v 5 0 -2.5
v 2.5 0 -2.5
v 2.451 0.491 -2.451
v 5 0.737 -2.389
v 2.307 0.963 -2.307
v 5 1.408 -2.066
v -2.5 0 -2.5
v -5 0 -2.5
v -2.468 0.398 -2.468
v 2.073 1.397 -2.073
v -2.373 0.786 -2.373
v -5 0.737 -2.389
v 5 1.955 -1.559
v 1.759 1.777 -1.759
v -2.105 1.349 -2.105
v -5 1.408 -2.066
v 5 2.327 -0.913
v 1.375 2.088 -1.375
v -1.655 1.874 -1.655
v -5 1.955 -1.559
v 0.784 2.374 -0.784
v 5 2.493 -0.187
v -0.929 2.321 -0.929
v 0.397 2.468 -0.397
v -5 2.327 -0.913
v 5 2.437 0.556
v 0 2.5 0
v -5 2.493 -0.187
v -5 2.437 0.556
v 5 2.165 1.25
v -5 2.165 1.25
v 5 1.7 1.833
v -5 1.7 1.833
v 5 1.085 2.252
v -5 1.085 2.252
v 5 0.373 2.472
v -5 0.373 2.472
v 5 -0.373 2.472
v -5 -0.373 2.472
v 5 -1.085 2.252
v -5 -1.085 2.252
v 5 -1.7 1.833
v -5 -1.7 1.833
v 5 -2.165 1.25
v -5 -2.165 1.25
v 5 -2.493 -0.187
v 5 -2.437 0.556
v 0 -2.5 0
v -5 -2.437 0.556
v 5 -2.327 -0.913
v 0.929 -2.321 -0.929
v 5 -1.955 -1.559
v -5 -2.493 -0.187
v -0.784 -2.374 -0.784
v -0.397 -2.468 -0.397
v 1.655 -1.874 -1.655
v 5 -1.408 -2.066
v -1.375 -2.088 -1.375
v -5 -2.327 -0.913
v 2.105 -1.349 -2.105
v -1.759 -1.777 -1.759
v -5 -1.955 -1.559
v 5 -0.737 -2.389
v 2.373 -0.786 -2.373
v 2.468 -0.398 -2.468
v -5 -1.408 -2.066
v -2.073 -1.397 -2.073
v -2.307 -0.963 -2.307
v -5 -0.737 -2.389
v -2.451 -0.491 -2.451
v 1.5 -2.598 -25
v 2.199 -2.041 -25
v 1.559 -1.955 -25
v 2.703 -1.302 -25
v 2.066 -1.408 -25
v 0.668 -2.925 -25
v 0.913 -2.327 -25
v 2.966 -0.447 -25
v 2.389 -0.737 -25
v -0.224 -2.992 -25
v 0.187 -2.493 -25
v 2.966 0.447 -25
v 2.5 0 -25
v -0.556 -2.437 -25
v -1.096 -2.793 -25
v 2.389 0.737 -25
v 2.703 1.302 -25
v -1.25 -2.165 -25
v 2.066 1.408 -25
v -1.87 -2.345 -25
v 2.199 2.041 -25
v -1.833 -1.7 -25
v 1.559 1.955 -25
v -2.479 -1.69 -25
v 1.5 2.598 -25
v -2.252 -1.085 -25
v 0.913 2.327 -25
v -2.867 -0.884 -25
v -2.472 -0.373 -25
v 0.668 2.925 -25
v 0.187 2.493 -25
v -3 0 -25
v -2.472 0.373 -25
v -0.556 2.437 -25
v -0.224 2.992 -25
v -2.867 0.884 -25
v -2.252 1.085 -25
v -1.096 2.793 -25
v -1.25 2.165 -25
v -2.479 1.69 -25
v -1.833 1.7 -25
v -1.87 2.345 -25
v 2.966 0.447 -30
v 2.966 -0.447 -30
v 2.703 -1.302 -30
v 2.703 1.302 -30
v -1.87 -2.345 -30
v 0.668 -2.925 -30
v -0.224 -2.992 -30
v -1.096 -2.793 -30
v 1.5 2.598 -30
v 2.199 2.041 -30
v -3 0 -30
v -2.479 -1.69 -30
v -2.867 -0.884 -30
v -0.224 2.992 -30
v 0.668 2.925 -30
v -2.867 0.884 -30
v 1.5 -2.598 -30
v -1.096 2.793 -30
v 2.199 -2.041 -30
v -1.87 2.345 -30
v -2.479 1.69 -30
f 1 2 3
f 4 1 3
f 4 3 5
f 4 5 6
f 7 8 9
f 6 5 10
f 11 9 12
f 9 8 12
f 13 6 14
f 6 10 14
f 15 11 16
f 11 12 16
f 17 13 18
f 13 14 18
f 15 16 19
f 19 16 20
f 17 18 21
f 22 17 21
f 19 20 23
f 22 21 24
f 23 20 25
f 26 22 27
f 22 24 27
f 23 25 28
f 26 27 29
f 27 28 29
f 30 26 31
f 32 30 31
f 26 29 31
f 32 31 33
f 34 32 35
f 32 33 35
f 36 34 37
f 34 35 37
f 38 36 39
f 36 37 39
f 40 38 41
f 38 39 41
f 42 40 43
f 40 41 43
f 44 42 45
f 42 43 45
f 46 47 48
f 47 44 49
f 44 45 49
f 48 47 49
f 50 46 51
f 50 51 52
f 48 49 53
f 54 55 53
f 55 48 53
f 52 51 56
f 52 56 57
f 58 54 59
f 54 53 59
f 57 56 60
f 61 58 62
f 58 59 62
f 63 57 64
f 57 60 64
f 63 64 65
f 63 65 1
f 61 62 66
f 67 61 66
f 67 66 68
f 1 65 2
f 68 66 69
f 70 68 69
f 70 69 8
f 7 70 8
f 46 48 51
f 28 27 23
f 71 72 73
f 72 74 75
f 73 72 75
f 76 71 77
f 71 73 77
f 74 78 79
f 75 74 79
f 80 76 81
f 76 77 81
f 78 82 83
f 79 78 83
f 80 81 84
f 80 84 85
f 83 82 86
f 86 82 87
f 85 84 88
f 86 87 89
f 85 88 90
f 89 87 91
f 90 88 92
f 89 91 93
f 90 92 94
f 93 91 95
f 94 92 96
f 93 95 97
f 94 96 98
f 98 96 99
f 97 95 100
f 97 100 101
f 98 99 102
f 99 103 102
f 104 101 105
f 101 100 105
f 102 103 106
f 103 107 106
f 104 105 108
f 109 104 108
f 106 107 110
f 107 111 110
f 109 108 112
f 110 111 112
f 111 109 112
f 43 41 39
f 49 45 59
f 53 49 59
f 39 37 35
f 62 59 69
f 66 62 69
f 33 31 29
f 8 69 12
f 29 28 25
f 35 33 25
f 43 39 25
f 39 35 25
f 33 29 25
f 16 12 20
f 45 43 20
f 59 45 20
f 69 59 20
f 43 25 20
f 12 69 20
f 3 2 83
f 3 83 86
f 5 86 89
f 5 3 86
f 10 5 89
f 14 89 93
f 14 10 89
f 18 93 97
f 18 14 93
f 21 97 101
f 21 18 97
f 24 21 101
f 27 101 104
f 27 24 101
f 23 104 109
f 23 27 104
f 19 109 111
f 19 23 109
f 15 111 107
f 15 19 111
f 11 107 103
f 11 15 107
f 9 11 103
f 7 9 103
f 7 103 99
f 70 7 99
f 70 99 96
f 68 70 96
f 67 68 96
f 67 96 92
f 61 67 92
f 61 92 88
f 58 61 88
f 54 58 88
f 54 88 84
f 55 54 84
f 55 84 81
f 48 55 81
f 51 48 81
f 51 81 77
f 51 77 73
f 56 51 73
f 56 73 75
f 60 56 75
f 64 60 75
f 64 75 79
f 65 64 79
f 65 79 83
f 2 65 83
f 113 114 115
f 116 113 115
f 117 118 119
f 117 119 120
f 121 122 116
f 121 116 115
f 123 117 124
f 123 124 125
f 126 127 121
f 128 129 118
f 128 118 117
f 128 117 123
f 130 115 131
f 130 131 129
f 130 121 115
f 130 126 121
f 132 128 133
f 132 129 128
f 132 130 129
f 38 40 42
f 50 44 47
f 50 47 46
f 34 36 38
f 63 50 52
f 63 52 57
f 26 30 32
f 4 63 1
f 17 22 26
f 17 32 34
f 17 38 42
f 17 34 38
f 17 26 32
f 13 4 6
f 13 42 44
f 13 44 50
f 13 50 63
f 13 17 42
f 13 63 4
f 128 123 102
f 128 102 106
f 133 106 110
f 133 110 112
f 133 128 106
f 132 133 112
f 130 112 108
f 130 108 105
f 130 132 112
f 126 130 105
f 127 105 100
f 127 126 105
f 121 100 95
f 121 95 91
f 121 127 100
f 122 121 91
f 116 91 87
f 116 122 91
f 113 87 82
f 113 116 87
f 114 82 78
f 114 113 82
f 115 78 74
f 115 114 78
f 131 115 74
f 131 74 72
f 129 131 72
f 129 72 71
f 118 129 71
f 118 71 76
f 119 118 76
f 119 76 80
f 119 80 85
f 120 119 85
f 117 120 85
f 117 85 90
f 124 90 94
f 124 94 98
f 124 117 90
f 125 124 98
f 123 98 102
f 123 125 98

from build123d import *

# Parameters (mm, degrees)
SKETCH1_R                = 2.5
BOSS_EXTRUDE1_DEPTH      = 30
BOSS_EXTRUDE2_DEPTH      = 5
BOSS_EXTRUDE2_DEPTH_BACK = 5
SKETCH2_R                = 2.5
SKETCH3_R                = 3
BOSS_EXTRUDE3_DEPTH      = 5


with BuildPart() as part:
    # Sketch1 → Boss-Extrude1 (new body)
    with BuildSketch(Plane.XY):
        Circle(SKETCH1_R)
    extrude(amount=-BOSS_EXTRUDE1_DEPTH)

    # Sketch2 → Boss-Extrude2 (add, two sides: drawn at the far end of the back side and taken through both)
    with BuildSketch(Plane(origin=(0, 0, 0), x_dir=(0, 0, -1), z_dir=(1, 0, 0)).offset(-BOSS_EXTRUDE2_DEPTH_BACK)):
        Circle(SKETCH2_R)
    extrude(amount=BOSS_EXTRUDE2_DEPTH + BOSS_EXTRUDE2_DEPTH_BACK)

    # Sketch3 → Boss-Extrude3 (add)
    with BuildSketch(Plane(origin=(0, 0, -30), x_dir=(-1, 0, 0), z_dir=(0, 0, -1))):
        Circle(SKETCH3_R)
    extrude(amount=-BOSS_EXTRUDE3_DEPTH)


solid = part.part
